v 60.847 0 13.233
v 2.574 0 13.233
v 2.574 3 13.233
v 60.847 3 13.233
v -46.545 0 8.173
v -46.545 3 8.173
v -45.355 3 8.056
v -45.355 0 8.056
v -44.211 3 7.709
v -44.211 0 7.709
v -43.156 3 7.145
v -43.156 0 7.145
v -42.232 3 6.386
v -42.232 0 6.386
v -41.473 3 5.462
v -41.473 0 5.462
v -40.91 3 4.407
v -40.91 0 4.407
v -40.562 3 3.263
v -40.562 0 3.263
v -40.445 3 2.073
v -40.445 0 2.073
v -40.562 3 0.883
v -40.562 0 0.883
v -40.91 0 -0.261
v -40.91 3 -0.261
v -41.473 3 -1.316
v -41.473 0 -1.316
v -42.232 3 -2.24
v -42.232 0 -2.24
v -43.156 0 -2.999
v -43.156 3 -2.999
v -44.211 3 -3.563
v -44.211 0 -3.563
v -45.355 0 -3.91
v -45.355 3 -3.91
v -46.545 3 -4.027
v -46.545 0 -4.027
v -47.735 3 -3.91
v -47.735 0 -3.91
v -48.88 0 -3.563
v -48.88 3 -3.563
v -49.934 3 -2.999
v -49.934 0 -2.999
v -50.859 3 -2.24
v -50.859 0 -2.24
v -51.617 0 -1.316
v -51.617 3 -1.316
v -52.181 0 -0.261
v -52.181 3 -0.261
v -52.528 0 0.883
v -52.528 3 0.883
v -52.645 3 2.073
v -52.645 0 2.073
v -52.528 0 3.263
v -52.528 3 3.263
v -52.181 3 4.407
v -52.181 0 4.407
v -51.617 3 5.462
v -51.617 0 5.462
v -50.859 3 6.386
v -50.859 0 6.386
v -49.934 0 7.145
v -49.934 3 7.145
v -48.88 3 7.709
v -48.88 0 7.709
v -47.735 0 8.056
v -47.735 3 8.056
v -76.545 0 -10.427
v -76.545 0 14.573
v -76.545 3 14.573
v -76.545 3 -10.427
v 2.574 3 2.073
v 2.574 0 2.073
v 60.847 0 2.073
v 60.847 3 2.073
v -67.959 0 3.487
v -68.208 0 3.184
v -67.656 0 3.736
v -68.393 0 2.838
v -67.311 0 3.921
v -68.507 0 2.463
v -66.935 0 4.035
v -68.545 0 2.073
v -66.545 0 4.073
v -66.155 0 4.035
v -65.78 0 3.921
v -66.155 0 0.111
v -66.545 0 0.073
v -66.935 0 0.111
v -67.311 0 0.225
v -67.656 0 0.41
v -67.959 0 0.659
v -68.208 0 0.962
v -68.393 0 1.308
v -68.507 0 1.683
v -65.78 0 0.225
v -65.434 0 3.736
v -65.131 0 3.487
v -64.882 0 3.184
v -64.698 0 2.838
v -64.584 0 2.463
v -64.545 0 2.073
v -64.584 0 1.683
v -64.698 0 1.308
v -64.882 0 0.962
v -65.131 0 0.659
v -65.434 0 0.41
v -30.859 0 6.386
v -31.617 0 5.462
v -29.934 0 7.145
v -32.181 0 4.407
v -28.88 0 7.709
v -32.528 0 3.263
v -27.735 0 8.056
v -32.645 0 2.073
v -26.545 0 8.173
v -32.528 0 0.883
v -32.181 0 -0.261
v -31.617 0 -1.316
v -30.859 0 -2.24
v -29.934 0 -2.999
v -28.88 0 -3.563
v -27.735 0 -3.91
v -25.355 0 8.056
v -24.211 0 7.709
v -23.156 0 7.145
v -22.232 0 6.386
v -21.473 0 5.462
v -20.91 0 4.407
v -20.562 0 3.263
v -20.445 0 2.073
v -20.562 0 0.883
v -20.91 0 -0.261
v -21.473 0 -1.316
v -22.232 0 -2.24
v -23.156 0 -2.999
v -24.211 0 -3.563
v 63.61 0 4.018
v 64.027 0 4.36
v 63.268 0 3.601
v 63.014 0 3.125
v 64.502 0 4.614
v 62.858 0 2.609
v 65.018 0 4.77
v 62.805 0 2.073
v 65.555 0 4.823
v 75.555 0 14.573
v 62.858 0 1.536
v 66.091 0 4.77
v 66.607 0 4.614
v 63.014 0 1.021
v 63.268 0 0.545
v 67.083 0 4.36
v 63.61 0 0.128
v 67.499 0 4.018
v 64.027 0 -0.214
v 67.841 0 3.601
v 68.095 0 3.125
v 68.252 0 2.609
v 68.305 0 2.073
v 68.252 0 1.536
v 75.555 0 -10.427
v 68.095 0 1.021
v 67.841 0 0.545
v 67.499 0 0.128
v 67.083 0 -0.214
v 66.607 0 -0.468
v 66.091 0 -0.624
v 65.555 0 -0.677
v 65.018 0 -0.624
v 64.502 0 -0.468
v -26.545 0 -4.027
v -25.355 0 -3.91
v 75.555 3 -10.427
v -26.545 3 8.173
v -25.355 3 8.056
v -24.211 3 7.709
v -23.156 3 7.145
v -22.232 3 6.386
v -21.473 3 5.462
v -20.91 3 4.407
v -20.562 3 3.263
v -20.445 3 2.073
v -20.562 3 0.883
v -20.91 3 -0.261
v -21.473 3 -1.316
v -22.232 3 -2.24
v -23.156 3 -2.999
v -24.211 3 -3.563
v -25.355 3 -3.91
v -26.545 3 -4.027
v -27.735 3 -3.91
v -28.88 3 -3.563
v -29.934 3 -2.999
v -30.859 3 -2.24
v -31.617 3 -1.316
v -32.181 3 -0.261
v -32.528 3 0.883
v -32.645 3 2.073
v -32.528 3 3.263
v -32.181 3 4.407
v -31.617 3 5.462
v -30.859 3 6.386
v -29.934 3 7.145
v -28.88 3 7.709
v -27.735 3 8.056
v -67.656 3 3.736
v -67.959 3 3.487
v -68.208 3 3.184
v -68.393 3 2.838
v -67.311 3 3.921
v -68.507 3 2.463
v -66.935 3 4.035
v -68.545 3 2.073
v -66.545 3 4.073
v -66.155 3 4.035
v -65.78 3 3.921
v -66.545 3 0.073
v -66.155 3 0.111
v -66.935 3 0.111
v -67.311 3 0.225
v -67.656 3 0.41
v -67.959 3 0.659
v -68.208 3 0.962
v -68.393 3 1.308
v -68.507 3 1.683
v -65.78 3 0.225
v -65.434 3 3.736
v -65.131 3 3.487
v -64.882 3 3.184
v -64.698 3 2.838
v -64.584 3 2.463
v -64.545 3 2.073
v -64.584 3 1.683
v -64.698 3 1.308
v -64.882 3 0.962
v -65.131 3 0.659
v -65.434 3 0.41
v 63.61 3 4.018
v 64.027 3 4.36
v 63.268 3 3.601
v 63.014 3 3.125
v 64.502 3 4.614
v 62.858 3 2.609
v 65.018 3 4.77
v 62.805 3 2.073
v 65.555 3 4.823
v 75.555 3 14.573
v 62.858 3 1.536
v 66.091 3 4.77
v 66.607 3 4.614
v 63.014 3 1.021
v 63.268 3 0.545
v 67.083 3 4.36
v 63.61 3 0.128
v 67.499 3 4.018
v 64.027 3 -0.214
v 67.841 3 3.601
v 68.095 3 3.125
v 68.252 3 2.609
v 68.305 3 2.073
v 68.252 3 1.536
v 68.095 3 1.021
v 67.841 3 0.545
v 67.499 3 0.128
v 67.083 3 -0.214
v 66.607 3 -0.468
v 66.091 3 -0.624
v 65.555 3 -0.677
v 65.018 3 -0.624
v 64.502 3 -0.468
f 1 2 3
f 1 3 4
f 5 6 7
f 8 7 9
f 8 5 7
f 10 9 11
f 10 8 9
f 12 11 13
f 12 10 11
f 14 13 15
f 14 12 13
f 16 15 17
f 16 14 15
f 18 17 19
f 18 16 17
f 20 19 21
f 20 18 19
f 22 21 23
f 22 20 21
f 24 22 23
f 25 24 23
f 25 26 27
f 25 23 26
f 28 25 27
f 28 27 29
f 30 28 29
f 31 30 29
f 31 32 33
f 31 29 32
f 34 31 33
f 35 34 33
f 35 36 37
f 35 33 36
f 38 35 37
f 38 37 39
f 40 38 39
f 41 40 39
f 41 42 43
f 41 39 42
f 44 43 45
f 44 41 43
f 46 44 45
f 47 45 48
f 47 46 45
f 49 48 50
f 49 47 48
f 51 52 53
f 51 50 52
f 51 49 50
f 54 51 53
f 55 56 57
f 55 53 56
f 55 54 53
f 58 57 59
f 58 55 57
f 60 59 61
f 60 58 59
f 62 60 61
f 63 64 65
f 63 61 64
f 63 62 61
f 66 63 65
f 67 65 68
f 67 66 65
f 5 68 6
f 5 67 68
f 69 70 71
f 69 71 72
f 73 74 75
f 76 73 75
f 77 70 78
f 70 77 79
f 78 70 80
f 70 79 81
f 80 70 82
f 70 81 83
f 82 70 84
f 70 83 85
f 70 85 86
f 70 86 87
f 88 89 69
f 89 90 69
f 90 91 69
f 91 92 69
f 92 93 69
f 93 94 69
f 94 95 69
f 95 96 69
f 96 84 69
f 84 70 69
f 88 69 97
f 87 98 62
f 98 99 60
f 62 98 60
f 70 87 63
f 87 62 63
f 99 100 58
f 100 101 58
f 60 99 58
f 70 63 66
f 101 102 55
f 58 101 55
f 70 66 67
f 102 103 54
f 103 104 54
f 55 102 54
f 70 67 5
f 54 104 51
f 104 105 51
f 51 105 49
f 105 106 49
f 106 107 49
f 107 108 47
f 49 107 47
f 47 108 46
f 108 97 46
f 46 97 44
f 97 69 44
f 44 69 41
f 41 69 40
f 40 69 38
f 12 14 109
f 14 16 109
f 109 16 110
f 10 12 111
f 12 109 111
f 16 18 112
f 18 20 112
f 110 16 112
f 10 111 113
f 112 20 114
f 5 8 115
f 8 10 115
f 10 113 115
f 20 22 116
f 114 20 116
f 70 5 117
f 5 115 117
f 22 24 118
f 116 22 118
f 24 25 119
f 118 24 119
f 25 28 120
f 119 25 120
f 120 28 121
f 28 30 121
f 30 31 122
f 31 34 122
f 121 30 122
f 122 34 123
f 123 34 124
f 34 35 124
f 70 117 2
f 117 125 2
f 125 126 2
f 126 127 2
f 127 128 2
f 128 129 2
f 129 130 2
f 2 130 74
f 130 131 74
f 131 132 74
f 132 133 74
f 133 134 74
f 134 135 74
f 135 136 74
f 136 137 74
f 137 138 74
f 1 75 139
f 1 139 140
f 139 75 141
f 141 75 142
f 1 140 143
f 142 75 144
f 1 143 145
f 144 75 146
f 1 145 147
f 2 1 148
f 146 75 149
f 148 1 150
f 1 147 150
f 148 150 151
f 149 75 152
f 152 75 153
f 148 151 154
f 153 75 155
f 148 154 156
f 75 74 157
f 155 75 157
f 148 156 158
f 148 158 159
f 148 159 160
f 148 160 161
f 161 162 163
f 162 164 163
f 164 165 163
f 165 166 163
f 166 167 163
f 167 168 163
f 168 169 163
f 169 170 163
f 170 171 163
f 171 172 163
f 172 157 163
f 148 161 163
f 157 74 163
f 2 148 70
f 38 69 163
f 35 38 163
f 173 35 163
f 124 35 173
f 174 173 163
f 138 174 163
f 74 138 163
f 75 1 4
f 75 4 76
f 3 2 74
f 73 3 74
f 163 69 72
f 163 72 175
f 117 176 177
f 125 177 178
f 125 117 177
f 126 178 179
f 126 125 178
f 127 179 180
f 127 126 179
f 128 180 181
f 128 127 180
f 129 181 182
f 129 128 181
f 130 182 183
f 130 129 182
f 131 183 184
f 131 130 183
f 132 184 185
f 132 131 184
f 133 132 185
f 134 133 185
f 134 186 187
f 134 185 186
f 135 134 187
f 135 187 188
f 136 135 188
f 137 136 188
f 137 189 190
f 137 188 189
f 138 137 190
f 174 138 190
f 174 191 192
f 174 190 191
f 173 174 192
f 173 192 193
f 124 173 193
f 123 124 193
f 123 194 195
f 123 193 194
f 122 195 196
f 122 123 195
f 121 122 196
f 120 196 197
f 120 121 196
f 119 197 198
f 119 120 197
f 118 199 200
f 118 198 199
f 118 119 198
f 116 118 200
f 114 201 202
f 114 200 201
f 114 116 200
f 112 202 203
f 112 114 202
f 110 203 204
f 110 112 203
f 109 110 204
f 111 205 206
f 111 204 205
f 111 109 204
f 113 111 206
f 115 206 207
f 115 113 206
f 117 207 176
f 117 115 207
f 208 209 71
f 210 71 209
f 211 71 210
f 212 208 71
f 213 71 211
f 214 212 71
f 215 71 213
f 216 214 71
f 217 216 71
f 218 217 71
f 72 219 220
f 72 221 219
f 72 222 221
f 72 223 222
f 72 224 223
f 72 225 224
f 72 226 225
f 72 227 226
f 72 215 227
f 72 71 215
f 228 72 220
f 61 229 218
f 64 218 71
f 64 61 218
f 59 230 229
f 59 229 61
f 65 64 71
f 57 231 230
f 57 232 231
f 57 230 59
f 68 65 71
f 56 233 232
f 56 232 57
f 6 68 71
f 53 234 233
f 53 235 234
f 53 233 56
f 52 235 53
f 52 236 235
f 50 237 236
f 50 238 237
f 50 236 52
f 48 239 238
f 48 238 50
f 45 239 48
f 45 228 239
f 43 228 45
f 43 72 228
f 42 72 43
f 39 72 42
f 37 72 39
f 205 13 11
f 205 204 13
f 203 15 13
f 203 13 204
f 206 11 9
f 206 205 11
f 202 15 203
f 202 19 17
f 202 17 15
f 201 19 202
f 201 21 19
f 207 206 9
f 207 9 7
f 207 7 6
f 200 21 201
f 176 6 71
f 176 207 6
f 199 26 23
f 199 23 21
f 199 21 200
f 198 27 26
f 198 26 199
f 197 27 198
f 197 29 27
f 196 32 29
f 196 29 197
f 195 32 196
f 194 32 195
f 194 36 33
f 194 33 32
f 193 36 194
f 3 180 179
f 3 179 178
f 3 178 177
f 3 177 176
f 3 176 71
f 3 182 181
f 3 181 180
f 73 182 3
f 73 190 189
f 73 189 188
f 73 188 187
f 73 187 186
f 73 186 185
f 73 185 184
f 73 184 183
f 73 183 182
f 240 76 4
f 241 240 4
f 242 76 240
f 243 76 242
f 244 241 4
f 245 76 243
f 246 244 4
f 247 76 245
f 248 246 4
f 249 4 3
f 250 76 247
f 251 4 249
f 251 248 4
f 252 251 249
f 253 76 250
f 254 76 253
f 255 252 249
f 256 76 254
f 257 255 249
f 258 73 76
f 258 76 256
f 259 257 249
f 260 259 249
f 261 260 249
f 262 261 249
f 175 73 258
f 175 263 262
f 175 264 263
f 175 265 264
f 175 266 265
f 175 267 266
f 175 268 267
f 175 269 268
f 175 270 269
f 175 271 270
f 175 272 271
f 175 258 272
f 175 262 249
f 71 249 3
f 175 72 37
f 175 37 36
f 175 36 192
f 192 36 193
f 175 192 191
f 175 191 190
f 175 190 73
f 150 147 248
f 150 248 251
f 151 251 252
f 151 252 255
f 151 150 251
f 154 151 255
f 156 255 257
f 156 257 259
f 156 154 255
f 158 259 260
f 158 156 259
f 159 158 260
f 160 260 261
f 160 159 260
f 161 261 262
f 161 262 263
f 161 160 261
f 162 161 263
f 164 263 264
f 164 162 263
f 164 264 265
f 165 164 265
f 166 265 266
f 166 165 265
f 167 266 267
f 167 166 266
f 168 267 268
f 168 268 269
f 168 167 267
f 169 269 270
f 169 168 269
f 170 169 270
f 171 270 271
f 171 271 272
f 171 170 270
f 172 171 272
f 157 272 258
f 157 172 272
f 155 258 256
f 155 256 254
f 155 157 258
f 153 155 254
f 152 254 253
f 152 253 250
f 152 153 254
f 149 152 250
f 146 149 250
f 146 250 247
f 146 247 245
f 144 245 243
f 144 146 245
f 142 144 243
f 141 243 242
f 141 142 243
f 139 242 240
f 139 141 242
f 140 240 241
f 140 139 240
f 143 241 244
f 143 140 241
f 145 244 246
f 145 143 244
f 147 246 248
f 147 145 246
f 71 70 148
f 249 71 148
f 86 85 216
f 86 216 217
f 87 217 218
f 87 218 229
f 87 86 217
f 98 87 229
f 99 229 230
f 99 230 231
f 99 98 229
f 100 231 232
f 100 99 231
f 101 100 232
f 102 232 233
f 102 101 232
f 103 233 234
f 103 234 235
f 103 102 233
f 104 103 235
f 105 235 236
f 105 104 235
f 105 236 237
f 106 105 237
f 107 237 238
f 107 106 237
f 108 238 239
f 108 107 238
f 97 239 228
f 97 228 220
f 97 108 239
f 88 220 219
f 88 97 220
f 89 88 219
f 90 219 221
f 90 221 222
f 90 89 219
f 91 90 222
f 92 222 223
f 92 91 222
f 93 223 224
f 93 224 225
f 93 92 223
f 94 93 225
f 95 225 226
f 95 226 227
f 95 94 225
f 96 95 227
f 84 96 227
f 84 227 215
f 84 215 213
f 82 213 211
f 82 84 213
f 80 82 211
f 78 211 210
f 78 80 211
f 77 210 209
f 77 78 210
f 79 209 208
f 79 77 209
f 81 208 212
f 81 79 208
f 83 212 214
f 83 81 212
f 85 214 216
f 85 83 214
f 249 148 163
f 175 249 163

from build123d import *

# Parameters (mm, degrees)
ESQUISSE1_W             = 152.1
ESQUISSE1_H             = 25
ESQUISSE1_R             = 2.75
ESQUISSE1_R_2           = 2
BOSS_EXTRU_1_DEPTH      = 3
ESQUISSE3_R             = 6.1
ESQUISSE3_W             = 58.273048821
ESQUISSE3_H             = 11.159952414
ENL_V_MAT_EXTRU_2_DEPTH = 78.977892392


with BuildPart() as part:
    # Esquisse1 → Boss.-Extru.1 (new body)
    with BuildSketch(Plane(origin=(0, 0, 0), x_dir=(1, 0, 0), z_dir=(0, 1, 0))):
        with Locations((-0.495280426, -2.072980011)):
            Rectangle(ESQUISSE1_W, ESQUISSE1_H)
        with Locations(Location((65.554719574, -2.072980011, 0), (0, 0, 270))):
            Circle(ESQUISSE1_R, mode=Mode.SUBTRACT)
        with Locations(Location((-66.545280426, -2.072980011, 0), (0, 0, 270))):
            Circle(ESQUISSE1_R_2, mode=Mode.SUBTRACT)
    extrude(amount=BOSS_EXTRU_1_DEPTH)

    # Esquisse3 → Enlèv. mat.-Extru.2 (cut, through all)
    with BuildSketch(Plane(origin=(0, 0, 0), x_dir=(1, 0, 0), z_dir=(0, 1, 0))):
        with Locations(Location((-46.545280426, -2.072980011, 0), (0, 0, 270))):
            Circle(ESQUISSE3_R)
        with Locations(Location((-26.545280426, -2.072980011, 0), (0, 0, 270))):
            Circle(ESQUISSE3_R)
        with Locations((31.710873838, -7.652956218)):
            Rectangle(ESQUISSE3_W, ESQUISSE3_H)
    extrude(amount=ENL_V_MAT_EXTRU_2_DEPTH, mode=Mode.SUBTRACT)


solid = part.part
